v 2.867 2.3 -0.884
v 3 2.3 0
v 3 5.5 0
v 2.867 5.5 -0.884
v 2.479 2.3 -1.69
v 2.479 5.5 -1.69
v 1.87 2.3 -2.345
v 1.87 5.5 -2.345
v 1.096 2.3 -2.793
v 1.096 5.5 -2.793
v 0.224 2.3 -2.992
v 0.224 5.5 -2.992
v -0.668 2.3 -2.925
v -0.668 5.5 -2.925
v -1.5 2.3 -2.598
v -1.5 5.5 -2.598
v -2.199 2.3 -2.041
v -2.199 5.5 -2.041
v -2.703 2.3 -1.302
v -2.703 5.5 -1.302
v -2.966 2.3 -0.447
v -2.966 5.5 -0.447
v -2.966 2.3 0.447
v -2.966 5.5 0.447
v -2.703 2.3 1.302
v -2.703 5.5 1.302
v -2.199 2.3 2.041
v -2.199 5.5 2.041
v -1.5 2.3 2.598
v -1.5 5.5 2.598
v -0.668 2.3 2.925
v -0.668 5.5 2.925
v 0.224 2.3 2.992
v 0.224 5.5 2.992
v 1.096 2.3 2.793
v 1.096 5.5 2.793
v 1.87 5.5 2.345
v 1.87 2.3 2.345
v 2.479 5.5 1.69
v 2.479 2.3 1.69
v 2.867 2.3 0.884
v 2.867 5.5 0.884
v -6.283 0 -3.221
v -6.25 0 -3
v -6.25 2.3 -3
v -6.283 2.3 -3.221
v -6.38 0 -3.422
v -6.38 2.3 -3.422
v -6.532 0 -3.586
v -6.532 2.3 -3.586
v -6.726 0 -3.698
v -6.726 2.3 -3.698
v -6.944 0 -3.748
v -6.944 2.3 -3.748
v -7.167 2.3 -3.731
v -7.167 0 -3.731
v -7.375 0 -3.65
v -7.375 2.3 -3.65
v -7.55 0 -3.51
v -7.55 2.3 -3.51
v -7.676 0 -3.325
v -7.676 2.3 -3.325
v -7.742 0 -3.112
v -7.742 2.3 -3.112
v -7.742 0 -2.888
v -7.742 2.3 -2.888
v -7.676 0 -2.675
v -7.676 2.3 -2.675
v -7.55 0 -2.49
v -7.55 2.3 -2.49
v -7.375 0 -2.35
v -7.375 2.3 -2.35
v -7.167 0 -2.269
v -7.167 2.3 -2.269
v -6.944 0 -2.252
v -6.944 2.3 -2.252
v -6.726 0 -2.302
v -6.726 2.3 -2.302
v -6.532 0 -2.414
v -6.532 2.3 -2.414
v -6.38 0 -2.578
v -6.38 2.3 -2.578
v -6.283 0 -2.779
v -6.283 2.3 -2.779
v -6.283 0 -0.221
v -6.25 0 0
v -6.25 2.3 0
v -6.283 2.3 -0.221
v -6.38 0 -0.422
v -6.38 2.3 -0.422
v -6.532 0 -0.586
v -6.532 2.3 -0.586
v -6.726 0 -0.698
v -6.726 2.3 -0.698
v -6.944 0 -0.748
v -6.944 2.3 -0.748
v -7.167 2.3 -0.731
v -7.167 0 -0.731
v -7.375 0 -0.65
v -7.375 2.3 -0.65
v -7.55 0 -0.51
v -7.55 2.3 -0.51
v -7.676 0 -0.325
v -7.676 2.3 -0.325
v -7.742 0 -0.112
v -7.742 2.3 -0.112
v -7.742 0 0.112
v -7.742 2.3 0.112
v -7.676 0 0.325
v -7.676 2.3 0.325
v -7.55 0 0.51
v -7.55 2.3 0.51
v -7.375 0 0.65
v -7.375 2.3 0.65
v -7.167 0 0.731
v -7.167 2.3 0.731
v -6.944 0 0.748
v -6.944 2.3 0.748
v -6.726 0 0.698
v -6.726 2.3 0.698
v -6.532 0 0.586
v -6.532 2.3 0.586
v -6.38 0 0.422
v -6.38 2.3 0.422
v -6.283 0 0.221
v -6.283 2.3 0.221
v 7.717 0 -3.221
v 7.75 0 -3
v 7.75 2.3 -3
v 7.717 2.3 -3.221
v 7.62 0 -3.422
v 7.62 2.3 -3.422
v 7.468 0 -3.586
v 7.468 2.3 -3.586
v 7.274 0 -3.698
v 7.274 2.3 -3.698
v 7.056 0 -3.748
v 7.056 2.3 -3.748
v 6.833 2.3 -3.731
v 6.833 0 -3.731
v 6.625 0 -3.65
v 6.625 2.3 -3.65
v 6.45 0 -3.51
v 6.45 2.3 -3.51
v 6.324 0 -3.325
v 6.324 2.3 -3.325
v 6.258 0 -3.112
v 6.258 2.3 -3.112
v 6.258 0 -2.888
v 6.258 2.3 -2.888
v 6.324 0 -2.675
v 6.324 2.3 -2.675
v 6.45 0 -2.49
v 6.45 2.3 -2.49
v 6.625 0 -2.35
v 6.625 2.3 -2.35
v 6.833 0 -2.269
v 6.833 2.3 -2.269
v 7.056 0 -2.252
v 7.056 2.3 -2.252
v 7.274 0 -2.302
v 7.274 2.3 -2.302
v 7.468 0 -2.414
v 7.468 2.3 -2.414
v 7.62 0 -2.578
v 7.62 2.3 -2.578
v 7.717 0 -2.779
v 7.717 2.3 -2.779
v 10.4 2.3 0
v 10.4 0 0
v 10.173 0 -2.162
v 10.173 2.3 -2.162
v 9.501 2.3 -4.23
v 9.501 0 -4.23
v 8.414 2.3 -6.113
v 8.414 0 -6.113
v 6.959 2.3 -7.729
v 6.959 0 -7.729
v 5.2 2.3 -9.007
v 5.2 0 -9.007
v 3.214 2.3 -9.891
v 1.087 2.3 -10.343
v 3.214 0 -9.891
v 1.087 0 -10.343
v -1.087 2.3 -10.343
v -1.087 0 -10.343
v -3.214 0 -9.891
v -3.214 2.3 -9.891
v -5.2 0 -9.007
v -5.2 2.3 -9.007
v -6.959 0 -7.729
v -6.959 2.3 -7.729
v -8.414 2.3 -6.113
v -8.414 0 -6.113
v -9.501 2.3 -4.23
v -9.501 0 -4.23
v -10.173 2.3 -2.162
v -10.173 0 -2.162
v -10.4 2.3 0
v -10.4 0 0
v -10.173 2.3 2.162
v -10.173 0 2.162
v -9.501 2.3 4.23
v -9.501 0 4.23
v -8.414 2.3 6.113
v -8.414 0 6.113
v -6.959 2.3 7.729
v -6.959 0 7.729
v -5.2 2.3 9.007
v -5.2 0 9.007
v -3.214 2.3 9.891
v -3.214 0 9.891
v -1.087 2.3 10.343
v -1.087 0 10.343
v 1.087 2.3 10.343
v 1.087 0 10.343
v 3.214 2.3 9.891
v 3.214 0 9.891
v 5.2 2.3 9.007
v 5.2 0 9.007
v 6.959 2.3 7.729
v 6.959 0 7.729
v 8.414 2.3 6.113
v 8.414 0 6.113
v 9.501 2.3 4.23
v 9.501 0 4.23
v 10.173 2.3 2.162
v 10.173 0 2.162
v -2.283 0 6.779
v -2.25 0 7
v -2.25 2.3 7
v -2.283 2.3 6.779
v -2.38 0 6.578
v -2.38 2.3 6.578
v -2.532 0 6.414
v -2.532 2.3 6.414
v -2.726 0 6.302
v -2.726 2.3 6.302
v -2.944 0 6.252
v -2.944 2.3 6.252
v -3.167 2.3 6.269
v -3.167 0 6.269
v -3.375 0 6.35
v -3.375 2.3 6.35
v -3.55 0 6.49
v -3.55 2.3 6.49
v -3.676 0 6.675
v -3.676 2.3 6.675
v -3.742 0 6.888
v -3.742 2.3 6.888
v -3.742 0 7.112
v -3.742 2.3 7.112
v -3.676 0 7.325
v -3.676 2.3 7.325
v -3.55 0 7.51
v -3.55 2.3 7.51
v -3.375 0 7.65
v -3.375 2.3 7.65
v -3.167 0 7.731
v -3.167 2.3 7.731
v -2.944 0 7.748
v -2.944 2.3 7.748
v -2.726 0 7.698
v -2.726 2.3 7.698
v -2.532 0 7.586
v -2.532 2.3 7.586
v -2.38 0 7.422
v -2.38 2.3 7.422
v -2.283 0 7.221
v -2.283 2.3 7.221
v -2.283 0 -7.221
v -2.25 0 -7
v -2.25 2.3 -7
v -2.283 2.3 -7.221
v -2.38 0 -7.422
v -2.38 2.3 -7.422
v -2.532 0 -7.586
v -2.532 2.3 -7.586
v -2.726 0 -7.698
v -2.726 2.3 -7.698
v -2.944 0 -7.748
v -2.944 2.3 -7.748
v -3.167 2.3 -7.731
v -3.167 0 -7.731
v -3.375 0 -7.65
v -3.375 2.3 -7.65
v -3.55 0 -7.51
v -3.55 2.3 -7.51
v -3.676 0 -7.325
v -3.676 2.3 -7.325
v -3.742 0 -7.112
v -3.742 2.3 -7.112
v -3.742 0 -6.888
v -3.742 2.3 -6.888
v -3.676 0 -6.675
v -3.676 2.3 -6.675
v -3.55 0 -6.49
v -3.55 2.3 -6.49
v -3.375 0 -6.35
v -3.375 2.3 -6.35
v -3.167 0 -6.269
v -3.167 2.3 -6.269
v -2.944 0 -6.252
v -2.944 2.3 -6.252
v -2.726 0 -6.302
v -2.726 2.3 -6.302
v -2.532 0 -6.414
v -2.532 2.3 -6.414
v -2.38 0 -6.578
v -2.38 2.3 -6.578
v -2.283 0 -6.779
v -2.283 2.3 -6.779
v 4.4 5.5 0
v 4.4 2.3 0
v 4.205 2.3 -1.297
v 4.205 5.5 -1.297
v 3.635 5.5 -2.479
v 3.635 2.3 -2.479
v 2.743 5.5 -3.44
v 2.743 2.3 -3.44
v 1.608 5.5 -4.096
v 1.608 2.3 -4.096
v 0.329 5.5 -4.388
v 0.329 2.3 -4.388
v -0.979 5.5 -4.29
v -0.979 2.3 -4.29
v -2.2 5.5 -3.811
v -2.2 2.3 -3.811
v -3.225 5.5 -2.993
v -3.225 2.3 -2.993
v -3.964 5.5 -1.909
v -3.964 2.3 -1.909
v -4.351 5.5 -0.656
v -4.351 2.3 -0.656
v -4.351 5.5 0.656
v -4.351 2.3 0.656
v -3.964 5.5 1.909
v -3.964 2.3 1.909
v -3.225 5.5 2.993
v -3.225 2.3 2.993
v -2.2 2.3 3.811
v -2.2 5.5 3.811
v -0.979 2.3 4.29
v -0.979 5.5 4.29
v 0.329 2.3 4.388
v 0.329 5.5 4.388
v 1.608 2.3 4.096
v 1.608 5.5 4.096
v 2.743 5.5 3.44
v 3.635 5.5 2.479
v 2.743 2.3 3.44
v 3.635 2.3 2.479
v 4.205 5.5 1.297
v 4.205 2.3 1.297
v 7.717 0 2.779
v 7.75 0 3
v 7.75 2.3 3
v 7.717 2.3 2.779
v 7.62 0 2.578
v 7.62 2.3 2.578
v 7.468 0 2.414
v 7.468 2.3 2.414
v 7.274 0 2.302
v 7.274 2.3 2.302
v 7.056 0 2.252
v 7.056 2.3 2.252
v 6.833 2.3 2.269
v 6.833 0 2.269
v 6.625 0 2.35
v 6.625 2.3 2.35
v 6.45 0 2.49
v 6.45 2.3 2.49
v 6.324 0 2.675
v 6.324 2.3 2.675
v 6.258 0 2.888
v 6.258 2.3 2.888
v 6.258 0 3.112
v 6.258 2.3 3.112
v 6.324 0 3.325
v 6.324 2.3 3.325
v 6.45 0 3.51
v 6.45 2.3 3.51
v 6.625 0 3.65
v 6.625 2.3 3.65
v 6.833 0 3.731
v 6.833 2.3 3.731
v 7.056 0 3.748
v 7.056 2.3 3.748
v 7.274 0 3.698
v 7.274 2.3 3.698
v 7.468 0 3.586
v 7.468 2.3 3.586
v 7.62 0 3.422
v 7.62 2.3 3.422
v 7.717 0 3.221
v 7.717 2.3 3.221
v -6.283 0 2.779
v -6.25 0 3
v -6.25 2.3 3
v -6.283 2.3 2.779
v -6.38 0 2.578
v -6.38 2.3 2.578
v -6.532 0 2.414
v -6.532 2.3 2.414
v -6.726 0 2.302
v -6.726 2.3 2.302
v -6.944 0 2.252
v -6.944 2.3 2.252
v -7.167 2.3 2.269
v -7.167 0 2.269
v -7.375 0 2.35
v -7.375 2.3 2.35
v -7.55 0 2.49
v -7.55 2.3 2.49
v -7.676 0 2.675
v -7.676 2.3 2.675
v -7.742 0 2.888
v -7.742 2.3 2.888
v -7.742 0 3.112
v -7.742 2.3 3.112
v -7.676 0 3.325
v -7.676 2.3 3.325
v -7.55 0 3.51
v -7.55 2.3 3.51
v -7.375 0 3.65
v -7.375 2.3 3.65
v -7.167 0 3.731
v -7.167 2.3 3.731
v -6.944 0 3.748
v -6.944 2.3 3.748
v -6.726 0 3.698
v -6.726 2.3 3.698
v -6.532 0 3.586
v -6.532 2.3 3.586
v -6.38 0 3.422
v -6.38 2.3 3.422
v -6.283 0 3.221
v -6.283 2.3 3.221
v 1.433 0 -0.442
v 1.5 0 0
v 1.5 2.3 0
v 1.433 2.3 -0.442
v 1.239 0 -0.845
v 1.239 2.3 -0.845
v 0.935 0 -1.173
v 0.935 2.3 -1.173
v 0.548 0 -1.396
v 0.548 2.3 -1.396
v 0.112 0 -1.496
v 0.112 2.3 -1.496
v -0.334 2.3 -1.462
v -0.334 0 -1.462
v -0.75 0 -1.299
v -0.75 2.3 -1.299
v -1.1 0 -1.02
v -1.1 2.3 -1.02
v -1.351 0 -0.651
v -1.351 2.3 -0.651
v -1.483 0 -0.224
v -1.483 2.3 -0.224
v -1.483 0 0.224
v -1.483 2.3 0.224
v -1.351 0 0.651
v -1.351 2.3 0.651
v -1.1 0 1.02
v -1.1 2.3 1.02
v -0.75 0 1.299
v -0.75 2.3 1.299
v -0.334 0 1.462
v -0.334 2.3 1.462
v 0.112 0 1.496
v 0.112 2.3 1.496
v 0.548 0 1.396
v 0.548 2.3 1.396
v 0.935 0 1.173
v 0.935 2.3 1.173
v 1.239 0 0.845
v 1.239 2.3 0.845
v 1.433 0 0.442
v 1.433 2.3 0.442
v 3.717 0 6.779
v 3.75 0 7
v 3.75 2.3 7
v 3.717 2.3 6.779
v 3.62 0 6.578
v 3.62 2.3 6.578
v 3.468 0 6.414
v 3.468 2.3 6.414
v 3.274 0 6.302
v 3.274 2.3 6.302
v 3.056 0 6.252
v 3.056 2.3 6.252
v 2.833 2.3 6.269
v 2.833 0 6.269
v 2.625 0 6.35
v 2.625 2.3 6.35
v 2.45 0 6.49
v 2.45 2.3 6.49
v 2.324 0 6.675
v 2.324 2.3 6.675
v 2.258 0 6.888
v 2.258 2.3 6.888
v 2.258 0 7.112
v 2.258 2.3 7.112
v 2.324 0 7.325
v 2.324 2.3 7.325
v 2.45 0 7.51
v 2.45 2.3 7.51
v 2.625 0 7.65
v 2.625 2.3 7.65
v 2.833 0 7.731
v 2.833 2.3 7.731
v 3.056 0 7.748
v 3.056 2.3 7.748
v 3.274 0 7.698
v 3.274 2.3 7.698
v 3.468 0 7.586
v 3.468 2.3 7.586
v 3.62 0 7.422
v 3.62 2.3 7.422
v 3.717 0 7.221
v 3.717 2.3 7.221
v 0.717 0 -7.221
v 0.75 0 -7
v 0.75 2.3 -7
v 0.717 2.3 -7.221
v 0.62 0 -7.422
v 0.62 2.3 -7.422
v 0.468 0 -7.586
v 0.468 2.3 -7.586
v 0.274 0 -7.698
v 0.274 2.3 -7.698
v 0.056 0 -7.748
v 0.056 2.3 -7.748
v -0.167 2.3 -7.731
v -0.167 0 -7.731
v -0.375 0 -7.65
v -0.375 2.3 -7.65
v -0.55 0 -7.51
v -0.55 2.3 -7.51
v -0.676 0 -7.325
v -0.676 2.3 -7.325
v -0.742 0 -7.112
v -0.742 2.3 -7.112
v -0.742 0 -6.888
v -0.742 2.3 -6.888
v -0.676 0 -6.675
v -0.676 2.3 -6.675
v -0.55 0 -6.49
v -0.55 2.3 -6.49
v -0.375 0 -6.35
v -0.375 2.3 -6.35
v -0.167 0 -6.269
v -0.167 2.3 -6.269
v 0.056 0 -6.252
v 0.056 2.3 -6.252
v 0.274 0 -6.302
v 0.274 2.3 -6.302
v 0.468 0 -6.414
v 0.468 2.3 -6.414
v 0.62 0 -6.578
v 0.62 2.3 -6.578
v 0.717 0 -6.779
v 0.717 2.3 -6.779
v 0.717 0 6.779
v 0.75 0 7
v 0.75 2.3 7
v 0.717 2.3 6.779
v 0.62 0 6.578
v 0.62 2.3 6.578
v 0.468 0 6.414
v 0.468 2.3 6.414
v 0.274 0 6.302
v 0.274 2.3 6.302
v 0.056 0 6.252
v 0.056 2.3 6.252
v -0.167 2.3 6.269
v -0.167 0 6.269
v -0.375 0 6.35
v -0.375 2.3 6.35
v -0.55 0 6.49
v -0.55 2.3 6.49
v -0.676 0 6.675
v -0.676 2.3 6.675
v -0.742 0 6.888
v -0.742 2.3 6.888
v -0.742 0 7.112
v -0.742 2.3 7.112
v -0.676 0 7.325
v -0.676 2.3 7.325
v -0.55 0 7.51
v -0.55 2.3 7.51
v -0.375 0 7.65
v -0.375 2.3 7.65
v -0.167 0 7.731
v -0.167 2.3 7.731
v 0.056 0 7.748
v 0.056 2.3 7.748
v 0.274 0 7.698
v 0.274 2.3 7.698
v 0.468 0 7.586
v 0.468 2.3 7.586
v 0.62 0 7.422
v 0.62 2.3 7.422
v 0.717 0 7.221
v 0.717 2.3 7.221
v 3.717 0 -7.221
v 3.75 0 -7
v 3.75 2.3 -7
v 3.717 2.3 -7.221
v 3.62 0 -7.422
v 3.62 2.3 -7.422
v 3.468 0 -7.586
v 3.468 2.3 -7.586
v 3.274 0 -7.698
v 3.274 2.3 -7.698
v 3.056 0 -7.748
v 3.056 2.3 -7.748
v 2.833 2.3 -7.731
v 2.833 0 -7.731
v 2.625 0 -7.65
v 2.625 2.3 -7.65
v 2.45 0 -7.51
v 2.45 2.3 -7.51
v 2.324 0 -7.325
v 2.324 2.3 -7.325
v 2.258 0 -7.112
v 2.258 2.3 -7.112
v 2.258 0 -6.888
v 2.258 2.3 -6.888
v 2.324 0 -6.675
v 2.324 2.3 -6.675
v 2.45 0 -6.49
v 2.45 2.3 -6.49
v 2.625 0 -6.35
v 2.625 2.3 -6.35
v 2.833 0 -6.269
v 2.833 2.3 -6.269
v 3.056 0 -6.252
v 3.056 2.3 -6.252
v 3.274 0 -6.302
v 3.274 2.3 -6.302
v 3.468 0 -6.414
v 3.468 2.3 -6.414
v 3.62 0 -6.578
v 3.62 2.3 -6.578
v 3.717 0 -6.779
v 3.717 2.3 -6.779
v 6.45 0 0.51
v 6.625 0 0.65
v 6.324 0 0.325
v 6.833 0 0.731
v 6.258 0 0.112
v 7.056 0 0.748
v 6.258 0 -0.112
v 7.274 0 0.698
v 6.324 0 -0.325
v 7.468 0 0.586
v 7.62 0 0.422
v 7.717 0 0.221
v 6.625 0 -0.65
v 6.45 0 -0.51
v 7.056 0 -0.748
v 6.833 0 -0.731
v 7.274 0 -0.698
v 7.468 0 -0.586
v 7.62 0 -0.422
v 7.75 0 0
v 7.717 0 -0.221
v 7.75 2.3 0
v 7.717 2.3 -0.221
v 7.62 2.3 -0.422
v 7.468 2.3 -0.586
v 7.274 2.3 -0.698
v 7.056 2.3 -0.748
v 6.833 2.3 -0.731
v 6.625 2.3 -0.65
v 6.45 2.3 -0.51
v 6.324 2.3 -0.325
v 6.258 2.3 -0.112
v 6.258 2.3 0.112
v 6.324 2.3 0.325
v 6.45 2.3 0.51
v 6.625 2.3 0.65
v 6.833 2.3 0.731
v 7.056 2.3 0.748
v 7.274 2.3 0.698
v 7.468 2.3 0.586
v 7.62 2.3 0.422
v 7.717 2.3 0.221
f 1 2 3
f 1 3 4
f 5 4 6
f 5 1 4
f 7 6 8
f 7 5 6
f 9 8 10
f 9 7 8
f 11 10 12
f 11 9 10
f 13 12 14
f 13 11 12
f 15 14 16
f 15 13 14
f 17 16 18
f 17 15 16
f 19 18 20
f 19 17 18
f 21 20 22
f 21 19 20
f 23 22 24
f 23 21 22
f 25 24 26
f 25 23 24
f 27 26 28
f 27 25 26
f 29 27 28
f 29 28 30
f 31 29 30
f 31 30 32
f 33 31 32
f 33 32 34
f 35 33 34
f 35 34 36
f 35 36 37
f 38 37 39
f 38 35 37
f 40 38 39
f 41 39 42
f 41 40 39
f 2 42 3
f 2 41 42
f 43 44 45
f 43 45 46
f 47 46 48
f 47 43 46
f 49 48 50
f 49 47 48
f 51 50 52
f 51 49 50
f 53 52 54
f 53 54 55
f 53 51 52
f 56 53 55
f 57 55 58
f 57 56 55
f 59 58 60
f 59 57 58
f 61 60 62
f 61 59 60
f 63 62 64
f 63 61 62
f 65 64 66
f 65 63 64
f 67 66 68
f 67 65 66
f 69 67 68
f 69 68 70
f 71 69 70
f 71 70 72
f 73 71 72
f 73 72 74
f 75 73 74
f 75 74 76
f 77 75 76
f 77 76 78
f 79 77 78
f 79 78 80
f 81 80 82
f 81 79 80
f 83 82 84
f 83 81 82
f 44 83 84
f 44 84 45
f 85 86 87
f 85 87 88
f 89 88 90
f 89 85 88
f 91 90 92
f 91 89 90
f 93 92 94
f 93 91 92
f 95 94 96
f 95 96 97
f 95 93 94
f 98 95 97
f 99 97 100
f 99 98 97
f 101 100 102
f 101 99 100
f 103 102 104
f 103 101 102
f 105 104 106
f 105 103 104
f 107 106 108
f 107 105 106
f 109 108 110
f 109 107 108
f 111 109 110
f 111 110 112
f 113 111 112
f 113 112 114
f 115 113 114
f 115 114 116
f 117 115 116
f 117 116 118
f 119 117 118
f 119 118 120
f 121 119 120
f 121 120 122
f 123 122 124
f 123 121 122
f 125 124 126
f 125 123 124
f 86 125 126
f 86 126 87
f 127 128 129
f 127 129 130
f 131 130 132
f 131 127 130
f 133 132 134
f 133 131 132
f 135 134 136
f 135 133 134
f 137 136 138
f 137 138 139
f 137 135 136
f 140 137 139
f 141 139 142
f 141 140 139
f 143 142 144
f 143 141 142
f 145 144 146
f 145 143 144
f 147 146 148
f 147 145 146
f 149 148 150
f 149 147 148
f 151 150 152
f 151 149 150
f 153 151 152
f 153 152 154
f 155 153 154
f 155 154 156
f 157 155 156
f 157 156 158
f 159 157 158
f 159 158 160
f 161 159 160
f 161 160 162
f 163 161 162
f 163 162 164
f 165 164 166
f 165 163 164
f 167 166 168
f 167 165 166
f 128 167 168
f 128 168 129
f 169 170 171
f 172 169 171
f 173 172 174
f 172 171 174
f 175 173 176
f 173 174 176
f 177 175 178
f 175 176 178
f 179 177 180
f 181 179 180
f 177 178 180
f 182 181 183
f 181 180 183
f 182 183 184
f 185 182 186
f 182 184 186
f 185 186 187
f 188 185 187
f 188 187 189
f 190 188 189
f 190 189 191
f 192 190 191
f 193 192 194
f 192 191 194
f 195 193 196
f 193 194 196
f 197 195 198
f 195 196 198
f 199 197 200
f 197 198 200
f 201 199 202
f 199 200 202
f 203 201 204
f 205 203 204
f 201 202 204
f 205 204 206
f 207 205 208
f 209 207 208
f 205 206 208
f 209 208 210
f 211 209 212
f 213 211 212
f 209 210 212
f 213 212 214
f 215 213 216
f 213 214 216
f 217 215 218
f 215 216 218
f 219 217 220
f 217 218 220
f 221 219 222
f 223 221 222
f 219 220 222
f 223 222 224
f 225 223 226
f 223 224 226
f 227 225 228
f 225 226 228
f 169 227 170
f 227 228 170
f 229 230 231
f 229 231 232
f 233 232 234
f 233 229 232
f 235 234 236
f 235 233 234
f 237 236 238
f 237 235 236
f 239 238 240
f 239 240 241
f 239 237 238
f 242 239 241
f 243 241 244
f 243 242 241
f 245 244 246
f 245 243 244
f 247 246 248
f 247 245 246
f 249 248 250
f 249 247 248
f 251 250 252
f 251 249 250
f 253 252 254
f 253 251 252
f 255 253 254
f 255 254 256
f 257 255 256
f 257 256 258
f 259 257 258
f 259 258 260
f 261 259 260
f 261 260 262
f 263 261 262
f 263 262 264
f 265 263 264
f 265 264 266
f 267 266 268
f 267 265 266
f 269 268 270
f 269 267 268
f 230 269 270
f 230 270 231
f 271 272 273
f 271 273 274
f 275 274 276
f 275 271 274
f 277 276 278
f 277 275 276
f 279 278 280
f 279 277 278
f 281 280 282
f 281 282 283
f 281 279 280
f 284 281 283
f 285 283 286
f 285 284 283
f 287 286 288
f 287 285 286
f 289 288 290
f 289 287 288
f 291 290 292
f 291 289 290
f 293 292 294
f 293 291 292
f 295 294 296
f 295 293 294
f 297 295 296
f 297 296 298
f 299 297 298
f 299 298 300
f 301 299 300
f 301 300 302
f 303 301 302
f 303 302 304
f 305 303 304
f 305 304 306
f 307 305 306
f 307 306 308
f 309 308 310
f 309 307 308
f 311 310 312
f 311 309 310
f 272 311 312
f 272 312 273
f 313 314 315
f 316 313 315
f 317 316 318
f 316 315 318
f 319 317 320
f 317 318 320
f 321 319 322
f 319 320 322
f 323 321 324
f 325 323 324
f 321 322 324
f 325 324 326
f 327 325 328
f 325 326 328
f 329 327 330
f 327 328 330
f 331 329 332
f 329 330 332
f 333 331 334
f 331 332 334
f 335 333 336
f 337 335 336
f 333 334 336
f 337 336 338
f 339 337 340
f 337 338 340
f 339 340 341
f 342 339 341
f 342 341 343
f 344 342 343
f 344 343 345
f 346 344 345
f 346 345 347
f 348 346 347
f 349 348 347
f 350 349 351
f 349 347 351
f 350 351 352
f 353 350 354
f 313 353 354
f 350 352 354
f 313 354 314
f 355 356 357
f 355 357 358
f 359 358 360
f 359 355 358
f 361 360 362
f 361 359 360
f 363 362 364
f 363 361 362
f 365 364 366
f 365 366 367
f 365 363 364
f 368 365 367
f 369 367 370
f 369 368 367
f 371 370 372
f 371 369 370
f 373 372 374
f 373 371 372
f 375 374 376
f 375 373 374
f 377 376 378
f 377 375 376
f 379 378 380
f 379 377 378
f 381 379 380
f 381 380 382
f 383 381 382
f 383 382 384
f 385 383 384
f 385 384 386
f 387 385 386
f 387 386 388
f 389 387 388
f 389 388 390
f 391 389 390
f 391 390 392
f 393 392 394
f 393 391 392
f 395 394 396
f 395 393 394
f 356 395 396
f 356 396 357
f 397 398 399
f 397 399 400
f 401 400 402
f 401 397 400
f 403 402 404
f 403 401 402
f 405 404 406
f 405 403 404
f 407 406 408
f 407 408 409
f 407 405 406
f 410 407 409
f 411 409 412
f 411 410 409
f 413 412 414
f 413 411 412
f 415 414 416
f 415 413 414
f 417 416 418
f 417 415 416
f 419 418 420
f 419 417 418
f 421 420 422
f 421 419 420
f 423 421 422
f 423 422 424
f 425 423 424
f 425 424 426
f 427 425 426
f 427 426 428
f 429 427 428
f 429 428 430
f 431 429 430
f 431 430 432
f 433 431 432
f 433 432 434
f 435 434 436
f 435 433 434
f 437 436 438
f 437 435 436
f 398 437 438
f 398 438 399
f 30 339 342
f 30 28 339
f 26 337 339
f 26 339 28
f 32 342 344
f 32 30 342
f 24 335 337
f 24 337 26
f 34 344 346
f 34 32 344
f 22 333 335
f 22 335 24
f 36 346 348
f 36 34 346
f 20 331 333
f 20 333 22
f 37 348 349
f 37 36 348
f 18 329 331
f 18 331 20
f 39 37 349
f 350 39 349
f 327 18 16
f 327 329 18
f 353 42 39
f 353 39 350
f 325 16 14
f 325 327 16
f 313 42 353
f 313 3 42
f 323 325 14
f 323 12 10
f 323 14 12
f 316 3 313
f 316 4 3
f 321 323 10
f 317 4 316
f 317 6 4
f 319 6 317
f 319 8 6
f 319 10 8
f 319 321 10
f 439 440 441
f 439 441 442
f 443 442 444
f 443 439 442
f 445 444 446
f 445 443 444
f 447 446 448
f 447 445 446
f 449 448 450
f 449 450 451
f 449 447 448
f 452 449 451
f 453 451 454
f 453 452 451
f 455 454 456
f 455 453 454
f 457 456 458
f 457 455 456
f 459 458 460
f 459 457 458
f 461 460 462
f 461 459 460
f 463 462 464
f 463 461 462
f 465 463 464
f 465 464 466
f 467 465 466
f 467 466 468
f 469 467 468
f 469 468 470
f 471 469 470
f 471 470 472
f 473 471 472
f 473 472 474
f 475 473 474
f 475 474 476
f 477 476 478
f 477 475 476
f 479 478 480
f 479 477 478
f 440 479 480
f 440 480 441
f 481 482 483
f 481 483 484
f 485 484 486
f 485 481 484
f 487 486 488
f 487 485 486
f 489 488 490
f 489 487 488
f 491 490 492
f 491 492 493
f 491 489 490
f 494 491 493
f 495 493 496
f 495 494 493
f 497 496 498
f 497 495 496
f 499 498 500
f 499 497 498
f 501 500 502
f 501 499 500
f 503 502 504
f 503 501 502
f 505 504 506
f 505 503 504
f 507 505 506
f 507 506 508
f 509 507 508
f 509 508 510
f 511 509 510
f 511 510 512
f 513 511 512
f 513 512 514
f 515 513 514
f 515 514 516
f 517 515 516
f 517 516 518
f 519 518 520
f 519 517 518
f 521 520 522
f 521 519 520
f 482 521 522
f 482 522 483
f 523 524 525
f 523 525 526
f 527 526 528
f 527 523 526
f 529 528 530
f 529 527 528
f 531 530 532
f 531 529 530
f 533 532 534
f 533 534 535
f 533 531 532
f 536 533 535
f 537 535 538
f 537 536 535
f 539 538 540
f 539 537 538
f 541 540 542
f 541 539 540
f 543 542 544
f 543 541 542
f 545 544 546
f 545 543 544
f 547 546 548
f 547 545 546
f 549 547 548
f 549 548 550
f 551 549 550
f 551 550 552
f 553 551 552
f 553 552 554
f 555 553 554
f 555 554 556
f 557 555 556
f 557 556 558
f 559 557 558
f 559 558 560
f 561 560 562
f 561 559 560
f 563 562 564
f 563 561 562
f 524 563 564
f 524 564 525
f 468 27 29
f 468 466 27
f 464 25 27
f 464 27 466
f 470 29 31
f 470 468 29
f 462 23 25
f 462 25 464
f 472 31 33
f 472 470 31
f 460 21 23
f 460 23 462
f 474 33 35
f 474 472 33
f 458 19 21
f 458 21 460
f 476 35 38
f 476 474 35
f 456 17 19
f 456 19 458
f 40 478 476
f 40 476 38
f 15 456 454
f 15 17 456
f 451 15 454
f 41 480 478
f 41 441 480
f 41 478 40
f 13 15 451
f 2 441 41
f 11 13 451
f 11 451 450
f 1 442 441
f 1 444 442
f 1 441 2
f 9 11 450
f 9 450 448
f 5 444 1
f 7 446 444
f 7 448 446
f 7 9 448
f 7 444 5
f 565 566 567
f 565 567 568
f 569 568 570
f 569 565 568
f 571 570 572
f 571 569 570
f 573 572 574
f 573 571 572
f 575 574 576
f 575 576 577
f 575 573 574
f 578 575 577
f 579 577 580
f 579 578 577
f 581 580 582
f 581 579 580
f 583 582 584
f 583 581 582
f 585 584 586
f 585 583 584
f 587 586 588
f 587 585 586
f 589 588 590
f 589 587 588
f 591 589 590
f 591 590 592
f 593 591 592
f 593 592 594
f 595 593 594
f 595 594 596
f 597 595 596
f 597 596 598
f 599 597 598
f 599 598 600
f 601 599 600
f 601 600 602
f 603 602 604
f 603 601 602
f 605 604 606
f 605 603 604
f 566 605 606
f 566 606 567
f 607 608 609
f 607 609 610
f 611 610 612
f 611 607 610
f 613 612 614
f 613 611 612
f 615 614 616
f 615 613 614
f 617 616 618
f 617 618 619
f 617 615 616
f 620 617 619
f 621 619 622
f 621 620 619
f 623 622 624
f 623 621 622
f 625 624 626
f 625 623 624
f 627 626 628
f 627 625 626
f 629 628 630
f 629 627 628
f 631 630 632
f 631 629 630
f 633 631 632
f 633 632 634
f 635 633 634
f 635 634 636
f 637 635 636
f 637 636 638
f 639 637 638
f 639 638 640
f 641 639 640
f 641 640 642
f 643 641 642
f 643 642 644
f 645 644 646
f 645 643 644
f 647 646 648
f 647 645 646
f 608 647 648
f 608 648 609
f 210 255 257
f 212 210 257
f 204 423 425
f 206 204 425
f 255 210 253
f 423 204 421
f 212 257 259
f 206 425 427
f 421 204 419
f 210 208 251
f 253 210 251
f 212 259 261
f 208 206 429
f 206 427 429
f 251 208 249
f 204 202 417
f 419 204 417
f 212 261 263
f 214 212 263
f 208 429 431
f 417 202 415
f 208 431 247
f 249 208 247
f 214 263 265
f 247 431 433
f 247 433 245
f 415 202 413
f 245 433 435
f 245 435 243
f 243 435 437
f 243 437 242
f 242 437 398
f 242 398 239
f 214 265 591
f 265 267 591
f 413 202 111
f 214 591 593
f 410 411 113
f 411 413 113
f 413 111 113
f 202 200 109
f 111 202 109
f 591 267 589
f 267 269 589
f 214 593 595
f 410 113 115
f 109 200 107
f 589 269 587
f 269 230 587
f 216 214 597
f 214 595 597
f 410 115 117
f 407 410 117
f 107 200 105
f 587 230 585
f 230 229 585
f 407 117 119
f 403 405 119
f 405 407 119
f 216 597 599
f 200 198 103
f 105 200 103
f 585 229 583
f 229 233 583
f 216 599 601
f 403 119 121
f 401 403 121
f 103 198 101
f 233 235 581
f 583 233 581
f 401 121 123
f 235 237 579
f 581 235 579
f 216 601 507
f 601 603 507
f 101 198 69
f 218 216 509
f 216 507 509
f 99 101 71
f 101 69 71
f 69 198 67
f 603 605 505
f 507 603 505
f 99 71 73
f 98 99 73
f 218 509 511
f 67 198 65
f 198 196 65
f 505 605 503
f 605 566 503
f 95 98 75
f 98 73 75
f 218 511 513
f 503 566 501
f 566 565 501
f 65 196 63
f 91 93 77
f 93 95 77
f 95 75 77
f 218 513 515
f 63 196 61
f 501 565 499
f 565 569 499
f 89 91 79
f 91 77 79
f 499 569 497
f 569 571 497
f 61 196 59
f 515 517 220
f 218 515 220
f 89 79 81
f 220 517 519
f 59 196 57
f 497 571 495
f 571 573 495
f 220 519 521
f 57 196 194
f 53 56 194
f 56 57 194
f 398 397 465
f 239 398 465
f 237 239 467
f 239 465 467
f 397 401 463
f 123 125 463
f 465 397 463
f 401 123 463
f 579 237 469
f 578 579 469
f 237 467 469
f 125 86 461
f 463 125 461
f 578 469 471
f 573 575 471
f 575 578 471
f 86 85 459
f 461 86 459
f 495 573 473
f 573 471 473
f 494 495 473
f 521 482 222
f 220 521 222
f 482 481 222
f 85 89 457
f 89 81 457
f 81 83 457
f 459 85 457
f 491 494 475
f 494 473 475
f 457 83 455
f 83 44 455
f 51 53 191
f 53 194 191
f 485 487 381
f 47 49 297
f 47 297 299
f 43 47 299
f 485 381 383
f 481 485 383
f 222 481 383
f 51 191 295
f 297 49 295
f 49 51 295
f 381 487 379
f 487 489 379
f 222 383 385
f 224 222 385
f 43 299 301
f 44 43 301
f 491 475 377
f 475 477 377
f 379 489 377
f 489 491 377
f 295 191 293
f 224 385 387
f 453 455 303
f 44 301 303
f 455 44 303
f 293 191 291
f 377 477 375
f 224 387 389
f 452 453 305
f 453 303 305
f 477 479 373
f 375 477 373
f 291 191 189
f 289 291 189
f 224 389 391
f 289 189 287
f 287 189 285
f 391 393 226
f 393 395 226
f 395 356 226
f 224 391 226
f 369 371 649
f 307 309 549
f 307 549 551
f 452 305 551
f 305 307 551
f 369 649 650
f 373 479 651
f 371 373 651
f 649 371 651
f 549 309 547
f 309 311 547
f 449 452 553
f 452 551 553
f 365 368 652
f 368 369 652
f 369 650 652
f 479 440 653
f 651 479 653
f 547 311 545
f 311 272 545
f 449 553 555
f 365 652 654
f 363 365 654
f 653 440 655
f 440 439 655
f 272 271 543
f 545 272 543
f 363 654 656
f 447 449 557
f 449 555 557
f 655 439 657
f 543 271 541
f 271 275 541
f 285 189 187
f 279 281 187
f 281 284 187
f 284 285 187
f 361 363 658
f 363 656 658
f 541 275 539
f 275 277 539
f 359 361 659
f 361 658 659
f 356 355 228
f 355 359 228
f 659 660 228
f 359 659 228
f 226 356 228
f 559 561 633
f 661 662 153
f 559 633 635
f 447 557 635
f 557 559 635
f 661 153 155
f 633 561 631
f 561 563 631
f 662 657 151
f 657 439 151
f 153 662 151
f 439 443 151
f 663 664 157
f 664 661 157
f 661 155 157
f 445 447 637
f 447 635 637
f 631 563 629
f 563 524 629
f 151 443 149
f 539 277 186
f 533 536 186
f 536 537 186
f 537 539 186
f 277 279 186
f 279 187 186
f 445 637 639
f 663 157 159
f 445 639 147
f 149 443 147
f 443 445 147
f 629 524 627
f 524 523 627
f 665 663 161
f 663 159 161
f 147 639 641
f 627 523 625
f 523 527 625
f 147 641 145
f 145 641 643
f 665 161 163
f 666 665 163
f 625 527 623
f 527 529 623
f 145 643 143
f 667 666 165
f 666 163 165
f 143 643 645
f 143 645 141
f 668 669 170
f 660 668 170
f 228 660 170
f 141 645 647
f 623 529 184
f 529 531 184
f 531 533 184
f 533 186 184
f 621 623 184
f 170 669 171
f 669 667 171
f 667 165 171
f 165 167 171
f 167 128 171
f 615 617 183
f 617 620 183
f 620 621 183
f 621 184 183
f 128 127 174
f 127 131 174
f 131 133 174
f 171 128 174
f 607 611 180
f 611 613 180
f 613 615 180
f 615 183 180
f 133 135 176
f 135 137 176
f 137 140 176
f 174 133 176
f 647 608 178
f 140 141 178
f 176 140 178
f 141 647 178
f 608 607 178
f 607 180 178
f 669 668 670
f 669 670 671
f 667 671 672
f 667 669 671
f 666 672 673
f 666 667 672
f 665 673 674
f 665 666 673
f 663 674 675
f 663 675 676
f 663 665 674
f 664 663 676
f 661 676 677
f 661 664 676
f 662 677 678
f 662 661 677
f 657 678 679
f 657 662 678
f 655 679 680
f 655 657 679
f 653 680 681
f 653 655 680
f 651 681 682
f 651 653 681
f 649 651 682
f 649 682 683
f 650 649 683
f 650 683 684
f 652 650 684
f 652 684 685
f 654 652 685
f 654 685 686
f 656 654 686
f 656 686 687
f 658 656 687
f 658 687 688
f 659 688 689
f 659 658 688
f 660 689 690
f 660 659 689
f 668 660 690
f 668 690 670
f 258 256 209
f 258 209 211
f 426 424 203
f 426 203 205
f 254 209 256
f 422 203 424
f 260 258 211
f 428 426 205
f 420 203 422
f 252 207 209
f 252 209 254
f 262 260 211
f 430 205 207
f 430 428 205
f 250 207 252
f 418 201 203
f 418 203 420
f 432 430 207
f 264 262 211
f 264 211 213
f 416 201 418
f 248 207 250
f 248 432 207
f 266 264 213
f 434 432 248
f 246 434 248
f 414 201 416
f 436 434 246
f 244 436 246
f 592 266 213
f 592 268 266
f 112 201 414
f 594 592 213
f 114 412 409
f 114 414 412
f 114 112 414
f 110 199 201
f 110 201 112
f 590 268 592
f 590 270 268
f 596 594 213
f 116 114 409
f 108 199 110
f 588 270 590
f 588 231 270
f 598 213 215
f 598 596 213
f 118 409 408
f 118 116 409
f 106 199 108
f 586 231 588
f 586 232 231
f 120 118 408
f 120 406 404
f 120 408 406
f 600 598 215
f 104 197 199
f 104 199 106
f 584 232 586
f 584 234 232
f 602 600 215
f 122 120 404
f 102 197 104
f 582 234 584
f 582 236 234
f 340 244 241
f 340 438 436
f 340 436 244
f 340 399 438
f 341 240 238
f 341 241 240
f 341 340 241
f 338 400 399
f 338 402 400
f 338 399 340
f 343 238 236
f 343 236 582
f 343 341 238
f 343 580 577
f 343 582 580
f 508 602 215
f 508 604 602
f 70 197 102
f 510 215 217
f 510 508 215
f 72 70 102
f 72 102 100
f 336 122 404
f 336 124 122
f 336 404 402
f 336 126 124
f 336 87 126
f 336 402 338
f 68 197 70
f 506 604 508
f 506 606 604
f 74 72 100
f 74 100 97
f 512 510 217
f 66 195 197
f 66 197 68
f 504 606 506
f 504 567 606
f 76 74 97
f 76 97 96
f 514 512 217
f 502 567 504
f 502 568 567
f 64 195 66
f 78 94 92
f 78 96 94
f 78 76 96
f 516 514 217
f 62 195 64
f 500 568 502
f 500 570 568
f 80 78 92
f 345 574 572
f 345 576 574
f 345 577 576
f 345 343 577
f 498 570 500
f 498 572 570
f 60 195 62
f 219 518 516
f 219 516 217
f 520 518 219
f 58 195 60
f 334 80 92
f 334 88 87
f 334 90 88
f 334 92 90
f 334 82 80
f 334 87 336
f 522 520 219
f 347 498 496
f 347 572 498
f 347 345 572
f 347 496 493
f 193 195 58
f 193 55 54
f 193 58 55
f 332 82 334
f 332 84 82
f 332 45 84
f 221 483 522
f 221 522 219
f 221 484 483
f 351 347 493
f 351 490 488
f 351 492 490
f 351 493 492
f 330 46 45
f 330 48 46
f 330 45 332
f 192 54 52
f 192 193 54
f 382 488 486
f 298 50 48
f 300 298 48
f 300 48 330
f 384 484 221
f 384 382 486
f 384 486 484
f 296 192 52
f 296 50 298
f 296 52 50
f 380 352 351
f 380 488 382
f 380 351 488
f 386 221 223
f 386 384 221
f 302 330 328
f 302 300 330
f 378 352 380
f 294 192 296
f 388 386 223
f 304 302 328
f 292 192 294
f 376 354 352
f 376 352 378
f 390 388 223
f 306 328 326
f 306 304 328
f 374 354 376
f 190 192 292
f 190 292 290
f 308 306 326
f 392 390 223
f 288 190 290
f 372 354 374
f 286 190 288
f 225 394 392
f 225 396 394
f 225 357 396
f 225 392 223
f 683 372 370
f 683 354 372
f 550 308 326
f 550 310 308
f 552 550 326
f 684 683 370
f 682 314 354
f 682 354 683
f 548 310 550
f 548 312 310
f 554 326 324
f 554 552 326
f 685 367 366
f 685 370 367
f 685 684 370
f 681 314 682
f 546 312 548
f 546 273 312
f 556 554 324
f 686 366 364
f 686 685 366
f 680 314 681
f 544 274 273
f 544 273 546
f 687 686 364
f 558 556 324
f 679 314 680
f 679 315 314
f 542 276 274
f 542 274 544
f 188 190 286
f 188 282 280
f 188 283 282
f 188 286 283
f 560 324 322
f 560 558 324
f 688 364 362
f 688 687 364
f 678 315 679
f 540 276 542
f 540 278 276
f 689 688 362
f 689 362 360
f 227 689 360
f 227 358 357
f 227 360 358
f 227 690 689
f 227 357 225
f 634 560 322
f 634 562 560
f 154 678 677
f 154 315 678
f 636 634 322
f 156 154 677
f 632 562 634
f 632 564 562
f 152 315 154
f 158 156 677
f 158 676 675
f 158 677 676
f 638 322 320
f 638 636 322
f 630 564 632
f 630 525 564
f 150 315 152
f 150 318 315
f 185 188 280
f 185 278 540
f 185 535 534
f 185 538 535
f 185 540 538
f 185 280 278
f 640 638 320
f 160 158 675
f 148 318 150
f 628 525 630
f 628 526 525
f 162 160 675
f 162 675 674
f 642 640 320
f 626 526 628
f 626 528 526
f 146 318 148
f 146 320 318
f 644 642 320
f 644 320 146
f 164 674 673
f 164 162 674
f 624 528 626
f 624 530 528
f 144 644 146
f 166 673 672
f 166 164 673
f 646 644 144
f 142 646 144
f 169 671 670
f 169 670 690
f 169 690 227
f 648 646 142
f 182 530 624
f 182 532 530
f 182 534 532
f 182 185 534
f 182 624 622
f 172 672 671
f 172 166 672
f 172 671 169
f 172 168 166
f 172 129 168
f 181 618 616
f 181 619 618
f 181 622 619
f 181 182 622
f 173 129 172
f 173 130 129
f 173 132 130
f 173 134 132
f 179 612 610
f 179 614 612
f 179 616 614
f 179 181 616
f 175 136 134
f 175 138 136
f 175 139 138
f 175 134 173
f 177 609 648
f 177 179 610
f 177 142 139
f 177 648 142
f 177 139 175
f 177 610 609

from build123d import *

# Parameters (mm, degrees)
SKETCH1_R           = 10.4
SKETCH1_R_2         = 0.75
SKETCH1_R_3         = 1.5
BOSS_EXTRUDE1_DEPTH = 2.3
SKETCH2_R           = 4.4
SKETCH2_R_2         = 3
BOSS_EXTRUDE2_DEPTH = 3.2


with BuildPart() as part:
    # Sketch1 → Boss-Extrude1 (new body)
    with BuildSketch(Plane(origin=(0, 0, 0), x_dir=(1, 0, 0), z_dir=(0, 1, 0))):
        Circle(SKETCH1_R)
        with Locations((7, 0)):
            Circle(SKETCH1_R_2, mode=Mode.SUBTRACT)
        with Locations((7, 3)):
            Circle(SKETCH1_R_2, mode=Mode.SUBTRACT)
        with Locations((7, -3)):
            Circle(SKETCH1_R_2, mode=Mode.SUBTRACT)
        with Locations((3, -7)):
            Circle(SKETCH1_R_2, mode=Mode.SUBTRACT)
        with Locations((0, -7)):
            Circle(SKETCH1_R_2, mode=Mode.SUBTRACT)
        with Locations((-3, -7)):
            Circle(SKETCH1_R_2, mode=Mode.SUBTRACT)
        with Locations((-7, -3)):
            Circle(SKETCH1_R_2, mode=Mode.SUBTRACT)
        with Locations((-7, 0)):
            Circle(SKETCH1_R_2, mode=Mode.SUBTRACT)
        with Locations((-7, 3)):
            Circle(SKETCH1_R_2, mode=Mode.SUBTRACT)
        with Locations((-3, 7)):
            Circle(SKETCH1_R_2, mode=Mode.SUBTRACT)
        with Locations((0, 7)):
            Circle(SKETCH1_R_2, mode=Mode.SUBTRACT)
        with Locations((3, 7)):
            Circle(SKETCH1_R_2, mode=Mode.SUBTRACT)
        Circle(SKETCH1_R_3, mode=Mode.SUBTRACT)
    extrude(amount=BOSS_EXTRUDE1_DEPTH)

    # Sketch2 → Boss-Extrude2 (add)
    with BuildSketch(Plane(origin=(0, 2.3, 0), x_dir=(1, 0, 0), z_dir=(0, 1, 0))):
        Circle(SKETCH2_R)
        Circle(SKETCH2_R_2, mode=Mode.SUBTRACT)
    extrude(amount=BOSS_EXTRUDE2_DEPTH)


solid = part.part
